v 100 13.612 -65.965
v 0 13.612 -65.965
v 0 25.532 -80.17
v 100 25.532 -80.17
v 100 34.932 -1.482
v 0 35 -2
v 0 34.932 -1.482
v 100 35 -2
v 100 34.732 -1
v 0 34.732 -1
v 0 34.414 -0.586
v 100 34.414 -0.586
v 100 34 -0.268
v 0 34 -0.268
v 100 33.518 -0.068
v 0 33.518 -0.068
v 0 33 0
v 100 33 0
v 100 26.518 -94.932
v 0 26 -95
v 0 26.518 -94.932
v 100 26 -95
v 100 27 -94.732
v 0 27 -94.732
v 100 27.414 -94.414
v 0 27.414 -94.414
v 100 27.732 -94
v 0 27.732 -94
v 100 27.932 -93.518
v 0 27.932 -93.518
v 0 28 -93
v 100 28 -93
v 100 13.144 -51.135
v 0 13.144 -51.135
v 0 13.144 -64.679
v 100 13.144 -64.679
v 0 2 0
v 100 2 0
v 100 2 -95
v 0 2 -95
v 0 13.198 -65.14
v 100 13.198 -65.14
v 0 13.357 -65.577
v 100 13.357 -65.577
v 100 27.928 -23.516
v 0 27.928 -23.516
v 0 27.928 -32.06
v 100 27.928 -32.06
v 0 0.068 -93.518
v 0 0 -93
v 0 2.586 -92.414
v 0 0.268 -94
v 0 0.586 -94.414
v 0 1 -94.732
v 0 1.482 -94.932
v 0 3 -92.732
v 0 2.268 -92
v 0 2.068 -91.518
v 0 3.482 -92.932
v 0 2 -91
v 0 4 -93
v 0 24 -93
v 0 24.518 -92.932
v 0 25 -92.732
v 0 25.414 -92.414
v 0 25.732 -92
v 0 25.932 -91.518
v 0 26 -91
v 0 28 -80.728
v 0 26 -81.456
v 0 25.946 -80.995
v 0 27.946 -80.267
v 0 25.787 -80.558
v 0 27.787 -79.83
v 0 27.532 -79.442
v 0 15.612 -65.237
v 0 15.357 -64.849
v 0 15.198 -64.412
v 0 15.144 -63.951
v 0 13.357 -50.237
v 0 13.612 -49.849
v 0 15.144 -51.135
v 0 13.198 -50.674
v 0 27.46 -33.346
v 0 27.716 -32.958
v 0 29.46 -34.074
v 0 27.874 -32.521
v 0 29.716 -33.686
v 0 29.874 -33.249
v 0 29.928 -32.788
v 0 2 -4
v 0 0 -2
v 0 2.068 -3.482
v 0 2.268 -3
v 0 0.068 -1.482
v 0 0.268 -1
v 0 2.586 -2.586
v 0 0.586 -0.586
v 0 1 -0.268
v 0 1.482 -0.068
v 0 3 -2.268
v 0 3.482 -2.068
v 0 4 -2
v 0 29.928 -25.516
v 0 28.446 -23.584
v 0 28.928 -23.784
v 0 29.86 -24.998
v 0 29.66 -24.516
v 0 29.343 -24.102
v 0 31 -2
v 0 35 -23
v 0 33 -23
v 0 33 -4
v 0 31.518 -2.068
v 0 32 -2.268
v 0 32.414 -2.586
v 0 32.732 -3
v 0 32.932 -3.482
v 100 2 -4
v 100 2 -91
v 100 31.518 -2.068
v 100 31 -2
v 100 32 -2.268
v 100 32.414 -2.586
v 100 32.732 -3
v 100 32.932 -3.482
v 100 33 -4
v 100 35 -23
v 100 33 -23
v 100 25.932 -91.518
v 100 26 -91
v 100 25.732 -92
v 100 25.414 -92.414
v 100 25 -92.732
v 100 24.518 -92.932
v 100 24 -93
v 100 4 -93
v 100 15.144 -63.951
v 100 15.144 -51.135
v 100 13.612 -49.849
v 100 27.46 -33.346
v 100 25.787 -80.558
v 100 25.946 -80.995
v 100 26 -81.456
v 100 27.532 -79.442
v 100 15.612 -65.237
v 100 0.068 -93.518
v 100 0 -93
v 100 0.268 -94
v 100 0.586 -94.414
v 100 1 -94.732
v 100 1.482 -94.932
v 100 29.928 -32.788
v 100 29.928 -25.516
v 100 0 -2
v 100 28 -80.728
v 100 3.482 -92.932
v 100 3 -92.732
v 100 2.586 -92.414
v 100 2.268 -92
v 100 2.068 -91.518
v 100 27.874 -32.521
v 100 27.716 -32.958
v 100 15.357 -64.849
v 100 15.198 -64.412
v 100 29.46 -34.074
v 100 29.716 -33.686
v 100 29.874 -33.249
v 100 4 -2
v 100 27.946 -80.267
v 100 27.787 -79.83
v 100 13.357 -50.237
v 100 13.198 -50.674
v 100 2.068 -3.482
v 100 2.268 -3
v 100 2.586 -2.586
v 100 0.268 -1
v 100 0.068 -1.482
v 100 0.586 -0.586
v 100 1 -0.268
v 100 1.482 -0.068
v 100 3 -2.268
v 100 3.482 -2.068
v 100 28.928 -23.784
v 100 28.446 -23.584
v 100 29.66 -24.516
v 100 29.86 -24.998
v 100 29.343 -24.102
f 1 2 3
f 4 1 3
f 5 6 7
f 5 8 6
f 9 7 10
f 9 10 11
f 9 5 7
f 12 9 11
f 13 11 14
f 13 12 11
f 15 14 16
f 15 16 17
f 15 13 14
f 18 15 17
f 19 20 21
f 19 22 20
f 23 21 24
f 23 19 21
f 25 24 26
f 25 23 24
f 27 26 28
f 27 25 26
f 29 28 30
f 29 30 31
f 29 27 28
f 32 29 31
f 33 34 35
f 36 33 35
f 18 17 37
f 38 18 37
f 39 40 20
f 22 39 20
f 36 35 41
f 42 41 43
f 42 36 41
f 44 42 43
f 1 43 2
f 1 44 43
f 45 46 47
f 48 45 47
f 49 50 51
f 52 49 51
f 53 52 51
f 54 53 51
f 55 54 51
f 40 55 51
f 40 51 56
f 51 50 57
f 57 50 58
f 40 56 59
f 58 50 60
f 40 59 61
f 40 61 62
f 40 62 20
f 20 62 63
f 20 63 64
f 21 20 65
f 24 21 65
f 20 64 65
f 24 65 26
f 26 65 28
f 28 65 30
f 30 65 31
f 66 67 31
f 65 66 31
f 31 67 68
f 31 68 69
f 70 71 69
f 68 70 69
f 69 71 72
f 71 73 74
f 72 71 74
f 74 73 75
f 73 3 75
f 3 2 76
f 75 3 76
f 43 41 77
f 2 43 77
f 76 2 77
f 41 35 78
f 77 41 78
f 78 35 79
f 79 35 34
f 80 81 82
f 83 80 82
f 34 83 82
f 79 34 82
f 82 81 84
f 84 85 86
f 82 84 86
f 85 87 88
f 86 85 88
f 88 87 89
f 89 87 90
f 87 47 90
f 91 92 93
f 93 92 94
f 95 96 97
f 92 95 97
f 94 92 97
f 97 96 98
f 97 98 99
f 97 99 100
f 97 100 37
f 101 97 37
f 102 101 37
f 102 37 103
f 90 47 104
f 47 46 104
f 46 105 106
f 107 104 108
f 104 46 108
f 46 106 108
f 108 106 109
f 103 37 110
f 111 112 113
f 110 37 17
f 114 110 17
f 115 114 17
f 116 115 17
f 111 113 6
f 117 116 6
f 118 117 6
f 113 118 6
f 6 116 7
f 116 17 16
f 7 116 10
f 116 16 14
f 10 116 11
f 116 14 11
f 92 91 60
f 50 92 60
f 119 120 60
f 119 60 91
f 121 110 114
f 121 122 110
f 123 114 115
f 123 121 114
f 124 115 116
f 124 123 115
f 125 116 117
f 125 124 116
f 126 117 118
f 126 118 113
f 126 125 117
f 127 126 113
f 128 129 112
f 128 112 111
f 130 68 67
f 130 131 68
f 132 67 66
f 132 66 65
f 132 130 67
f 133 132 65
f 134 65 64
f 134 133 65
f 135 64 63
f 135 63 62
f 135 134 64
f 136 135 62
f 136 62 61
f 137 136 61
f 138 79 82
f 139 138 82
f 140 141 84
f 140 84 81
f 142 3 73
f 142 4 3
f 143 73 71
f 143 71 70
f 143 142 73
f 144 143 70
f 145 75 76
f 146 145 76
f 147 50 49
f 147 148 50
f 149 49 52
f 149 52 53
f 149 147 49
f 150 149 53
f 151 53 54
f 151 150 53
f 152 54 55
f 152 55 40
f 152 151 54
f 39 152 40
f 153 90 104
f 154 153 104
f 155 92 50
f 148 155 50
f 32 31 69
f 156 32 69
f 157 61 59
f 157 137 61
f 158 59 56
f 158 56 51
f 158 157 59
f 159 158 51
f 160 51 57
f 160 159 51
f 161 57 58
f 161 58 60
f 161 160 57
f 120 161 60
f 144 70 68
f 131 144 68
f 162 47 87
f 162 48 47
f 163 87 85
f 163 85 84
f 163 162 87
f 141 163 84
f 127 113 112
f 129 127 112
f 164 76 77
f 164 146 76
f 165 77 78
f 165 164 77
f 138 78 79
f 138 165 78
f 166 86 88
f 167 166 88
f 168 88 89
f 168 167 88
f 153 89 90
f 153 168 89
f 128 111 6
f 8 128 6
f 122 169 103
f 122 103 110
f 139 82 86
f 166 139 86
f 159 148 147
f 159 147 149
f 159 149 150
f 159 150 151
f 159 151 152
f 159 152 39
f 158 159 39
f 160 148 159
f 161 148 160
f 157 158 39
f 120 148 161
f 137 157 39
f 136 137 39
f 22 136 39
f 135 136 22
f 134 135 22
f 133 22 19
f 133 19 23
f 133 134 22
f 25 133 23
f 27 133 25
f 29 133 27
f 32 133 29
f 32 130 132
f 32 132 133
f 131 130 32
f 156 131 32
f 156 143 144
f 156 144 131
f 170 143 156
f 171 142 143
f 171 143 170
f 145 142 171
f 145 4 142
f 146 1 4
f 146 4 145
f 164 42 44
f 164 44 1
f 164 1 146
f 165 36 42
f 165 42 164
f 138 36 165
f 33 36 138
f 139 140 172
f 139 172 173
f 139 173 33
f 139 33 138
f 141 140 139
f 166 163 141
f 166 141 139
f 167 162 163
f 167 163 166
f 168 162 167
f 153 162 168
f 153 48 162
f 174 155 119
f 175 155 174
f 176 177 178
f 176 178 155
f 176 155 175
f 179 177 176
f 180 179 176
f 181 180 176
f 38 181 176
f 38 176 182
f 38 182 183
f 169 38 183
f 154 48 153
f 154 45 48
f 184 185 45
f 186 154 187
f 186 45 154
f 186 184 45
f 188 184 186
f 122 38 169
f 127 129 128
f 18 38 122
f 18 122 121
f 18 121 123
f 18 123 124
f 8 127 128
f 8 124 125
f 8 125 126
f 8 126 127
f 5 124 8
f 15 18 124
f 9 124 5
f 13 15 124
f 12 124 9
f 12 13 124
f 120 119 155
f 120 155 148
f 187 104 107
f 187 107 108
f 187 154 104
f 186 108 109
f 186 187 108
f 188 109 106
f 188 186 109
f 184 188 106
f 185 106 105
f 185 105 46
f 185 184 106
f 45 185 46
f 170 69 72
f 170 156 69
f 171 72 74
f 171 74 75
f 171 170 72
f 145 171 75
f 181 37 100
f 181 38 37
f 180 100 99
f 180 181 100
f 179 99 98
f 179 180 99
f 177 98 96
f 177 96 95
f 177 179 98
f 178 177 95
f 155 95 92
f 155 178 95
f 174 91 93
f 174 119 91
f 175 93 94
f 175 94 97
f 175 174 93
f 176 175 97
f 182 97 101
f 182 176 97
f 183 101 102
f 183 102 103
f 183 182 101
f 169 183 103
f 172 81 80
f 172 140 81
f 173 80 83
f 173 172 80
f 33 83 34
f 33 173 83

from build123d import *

# Parameters (mm, degrees)
F1_DEPTH = 100
F2_R     = 1.99999


# Not quite as in the source:
# - a fillet or chamfer is up to 0.001 mm smaller than in the source, because OpenCascade refuses the exact size


with BuildPart() as f1:
    # F0 (on Right) → F1 (new body)
    with BuildSketch(Plane.YZ):
        Polygon((33, -23), (35, -23), (35, 0), (0, 0), (0, -95), (28, -95), (28, -80), (15.1442478063, -64.6791111376), (15.1442478063, -51.1349920747), (29.9283628291, -33.5159698829), (29.9283628291, -23.5159698829), (27.9283628291, -23.5159698829), (27.9283628291, -32.7880294144), (13.1442478063, -50.4070516062), (13.1442478063, -65.4070516062), (26, -80.7279404685), (26, -93), (2, -93), (2, -2), (33, -2), align=None)
    extrude(amount=F1_DEPTH)

    # F2 (radius 2 in the source; OpenCascade refuses exactly that, so slightly less here)
    f2_edges = [f1.edges().sort_by_distance(p)[0] for p in [
        (50, 35, 0),
        (50, 0, 0),
        (50, 33, -2),
        (50, 2, -2),
        (50, 0, -95),
        (50, 28, -95),
        (50, 28, -80),
        (50, 2, -93),
        (50, 26, -93),
        (50, 26, -80.72794),
        (50, 27.928363, -32.788029),
        (50, 15.144248, -64.679111),
        (50, 29.928363, -33.51597),
        (50, 29.928363, -23.51597),
        (50, 13.144248, -50.407052),
        (50, 13.144248, -65.407052),
    ]]
    fillet(f2_edges, radius=F2_R)


solid = f1.part
